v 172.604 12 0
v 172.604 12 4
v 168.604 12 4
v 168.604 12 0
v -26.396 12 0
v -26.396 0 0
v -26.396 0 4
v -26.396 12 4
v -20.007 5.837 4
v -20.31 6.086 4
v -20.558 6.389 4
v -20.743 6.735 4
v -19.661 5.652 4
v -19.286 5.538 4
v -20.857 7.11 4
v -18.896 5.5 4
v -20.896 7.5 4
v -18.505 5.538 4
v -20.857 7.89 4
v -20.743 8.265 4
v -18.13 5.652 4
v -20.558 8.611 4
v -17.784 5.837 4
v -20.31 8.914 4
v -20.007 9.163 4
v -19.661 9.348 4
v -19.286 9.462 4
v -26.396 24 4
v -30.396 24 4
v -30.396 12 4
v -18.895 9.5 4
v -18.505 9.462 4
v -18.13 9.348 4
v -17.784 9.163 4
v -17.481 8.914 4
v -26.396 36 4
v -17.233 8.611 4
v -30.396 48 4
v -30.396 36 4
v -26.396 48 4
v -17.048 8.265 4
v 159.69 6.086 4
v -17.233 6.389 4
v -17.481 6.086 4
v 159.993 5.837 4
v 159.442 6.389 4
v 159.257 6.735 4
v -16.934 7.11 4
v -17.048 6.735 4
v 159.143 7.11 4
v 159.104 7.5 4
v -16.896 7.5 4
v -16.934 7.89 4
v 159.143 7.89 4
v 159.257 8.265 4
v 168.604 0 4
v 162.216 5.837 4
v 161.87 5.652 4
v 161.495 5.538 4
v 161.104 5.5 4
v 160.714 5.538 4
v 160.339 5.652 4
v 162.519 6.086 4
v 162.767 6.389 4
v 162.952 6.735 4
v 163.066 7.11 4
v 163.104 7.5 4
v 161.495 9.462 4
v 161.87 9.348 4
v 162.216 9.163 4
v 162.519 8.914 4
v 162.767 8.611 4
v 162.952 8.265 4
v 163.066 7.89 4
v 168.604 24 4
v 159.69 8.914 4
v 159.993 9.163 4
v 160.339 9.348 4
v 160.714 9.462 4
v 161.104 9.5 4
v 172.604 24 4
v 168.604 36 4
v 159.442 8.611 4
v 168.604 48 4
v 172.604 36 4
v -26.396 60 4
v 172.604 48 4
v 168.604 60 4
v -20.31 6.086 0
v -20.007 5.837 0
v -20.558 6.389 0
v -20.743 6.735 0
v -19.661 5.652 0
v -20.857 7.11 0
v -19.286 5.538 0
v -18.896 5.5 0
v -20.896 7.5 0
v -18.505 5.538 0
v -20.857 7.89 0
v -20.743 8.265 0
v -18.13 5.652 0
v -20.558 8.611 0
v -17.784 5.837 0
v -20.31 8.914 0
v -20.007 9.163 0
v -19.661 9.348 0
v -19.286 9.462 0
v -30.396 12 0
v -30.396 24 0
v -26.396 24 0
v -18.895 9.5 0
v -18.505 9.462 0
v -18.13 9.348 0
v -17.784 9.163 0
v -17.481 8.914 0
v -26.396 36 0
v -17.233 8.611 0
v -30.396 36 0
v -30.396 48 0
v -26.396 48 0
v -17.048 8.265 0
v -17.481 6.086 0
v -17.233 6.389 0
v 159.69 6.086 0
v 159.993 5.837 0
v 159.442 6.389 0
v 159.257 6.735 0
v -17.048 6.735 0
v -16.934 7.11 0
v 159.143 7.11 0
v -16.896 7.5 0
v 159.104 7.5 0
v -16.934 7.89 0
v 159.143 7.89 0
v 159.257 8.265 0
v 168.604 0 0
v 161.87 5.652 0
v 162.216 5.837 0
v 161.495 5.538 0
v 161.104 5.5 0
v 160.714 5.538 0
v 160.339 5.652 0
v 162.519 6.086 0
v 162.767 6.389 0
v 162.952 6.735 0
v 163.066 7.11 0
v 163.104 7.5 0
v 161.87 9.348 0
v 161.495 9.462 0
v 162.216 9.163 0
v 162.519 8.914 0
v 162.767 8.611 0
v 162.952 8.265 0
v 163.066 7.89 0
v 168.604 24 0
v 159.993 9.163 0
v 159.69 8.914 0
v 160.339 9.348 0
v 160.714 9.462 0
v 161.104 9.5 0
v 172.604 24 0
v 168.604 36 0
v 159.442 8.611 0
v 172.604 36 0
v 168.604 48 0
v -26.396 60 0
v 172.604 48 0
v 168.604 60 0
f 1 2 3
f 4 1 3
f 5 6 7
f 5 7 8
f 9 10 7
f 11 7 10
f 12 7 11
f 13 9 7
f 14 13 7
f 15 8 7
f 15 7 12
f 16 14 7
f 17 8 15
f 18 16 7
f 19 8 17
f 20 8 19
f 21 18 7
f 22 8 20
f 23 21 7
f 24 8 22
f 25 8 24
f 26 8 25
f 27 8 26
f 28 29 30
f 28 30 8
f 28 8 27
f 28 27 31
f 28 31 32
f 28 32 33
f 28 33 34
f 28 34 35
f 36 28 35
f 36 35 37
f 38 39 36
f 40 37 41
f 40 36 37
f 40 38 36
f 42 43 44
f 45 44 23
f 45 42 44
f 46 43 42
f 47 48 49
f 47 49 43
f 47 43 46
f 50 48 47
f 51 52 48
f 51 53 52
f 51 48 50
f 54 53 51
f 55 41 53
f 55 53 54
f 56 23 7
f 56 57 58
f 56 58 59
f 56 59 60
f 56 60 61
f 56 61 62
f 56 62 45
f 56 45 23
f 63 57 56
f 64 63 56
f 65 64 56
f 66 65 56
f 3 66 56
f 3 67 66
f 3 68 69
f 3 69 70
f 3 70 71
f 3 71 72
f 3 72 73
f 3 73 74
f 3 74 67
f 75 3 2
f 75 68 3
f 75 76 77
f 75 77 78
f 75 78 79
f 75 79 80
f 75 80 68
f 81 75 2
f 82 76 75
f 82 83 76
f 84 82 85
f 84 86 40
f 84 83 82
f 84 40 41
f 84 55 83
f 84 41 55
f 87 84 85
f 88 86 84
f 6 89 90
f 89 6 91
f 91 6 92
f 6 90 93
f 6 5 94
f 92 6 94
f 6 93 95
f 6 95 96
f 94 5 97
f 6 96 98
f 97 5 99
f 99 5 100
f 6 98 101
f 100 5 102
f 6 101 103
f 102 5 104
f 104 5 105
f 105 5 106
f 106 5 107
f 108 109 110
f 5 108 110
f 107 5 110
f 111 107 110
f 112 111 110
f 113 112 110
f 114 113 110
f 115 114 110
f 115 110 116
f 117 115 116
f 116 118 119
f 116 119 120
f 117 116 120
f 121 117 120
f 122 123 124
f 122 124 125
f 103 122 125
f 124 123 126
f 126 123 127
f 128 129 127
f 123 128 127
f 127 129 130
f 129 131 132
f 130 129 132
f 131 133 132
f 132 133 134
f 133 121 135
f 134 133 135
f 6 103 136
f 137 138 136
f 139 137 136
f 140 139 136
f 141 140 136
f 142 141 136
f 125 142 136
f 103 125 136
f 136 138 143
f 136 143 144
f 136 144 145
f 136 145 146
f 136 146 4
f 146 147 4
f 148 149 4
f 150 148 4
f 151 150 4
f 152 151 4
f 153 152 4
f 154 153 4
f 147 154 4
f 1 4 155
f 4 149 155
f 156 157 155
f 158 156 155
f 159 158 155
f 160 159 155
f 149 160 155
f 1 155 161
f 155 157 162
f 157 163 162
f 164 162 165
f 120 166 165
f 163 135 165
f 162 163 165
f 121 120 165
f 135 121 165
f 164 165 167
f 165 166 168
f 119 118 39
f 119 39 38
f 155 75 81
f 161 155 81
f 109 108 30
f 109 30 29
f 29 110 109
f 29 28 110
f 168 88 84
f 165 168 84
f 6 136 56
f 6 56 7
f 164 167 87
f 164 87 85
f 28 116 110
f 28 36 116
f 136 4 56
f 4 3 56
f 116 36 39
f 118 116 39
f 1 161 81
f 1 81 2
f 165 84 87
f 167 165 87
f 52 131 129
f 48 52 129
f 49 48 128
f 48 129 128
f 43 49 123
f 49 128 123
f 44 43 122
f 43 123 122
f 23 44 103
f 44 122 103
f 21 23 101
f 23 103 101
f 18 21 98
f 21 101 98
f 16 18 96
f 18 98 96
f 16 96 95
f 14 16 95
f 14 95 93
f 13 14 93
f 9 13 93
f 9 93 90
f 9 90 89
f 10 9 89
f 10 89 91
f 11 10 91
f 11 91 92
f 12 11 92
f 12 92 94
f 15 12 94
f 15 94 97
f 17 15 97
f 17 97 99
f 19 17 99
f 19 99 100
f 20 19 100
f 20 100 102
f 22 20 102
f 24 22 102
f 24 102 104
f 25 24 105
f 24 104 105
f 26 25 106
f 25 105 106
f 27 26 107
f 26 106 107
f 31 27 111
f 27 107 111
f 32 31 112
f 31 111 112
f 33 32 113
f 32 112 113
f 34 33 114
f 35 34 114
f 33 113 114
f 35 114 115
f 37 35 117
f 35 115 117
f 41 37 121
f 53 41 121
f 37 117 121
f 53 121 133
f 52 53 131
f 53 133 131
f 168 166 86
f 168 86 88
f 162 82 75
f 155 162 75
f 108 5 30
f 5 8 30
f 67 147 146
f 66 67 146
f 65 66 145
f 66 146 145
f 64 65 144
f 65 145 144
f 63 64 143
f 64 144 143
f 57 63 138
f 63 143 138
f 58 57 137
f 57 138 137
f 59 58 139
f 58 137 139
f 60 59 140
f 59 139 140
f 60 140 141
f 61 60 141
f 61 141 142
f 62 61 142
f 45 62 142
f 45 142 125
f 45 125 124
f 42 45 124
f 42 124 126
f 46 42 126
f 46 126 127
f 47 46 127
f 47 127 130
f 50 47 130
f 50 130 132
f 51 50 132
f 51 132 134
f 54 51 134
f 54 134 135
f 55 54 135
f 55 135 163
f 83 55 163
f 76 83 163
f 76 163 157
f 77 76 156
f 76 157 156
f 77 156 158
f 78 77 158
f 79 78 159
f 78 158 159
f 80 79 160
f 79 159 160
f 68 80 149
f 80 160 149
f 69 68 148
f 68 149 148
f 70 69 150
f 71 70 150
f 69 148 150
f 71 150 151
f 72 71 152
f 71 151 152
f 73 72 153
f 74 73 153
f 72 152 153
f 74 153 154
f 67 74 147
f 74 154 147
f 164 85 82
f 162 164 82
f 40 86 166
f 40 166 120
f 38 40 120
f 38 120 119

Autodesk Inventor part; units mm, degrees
ref_plane "YZ Plane" through (0, 0, 0) normal (1, 0, 0) x (0, 1, 0)
ref_plane "XZ Plane" through (0, 0, 0) normal (0, 1, 0) x (-1, 0, 0)
ref_plane "XY Plane" through (0, 0, 0) normal (0, 0, 1) x (1, 0, 0)
sketch "Эскиз1" plane through (0, 0, 0) normal (0, 0, 1) x (1, 0, 0)
  line L0 (-26.3955, 0) -> (-26.3955, 30) projected
  line L1 (168.6045, 0) -> (168.6045, 30) projected
  circle A0 centre (161.1045, 7.5) radius 2 projected
  circle A1 centre (-18.8955, 7.5) radius 2 projected
  line L2 (-26.3955, 60.0004) -> (-30.3955, 60.0004) projected
  line L3 (172.6045, 60.0004) -> (168.6045, 60.0004) projected
  line L4 (-26.3955, 60.0004) -> (168.6045, 60.0004)
  line L5 (168.6045, 60.0004) -> (168.6045, 0)
  line L6 (168.6045, 0) -> (-26.3955, 0)
  line L7 (-26.3955, 0) -> (-26.3955, 60.0004)
  point P0 (0, 0)
extrude "Выдавливание1" add sketch "Эскиз1" along normal blind 4
thicken "Толщина1" operation add thickness 4 both sides no extend neighbours yes toward (1, 0, 0) faces at (168.6045, 10, 1.3333)
thicken "Толщина2" operation add thickness 4 both sides no extend neighbours yes toward (-1, 0, 0) faces at (-26.3955, 40.0003, 2.6667)
sketch "Эскиз2" plane through (0, 0, 4) normal (0, 0, 1) x (1, 0, 0)
  line L0 (172.6045, 60.0004) -> (-30.3955, 60.0004) projected
  line L1 (-30.3955, 60.0004) -> (-26.3955, 60.0004)
  line L2 (-26.3955, 60.0004) -> (-26.3955, 48.0004)
  line L3 (-26.3955, 48.0004) -> (-30.3955, 48.0004)
  line L4 (-30.3955, 48.0004) -> (-30.3955, 60.0004)
  line L5 (172.6045, 60.0004) -> (168.6045, 60.0004)
  line L6 (168.6045, 60.0004) -> (168.6045, 48.0004)
  line L7 (168.6045, 48.0004) -> (172.6045, 48.0004)
  line L8 (172.6045, 48.0004) -> (172.6045, 60.0004)
  point P0 (0, 0)
  dimension "d6" = 4
  dimension "d7" = 12
  dimension "d8" = 4
  dimension "d9" = 12
extrude "Выдавливание2" cut sketch "Эскиз2" against normal blind 4
pattern_linear "Прямоуг.массив1" count 3 spacing 24 along (0, -1, 0) of "Выдавливание2"
thicken "Толщина3" operation add thickness 4 both sides no extend neighbours yes toward (1, 0, 0) faces at (-30.3955, 0.0003, 1.3333) (-29.0622, 0.0004, 2.6667)
thicken "Толщина4" operation add thickness 4 both sides no extend neighbours yes toward (-1, 0, 0) faces at (172.6045, 0.0001, 1.3333) (169.9378, 0.0004, 2.6667)
properties part number "KB33-046-004-014 - Лицевая вертикальня пластина" material "Пластик ПЭТ"
